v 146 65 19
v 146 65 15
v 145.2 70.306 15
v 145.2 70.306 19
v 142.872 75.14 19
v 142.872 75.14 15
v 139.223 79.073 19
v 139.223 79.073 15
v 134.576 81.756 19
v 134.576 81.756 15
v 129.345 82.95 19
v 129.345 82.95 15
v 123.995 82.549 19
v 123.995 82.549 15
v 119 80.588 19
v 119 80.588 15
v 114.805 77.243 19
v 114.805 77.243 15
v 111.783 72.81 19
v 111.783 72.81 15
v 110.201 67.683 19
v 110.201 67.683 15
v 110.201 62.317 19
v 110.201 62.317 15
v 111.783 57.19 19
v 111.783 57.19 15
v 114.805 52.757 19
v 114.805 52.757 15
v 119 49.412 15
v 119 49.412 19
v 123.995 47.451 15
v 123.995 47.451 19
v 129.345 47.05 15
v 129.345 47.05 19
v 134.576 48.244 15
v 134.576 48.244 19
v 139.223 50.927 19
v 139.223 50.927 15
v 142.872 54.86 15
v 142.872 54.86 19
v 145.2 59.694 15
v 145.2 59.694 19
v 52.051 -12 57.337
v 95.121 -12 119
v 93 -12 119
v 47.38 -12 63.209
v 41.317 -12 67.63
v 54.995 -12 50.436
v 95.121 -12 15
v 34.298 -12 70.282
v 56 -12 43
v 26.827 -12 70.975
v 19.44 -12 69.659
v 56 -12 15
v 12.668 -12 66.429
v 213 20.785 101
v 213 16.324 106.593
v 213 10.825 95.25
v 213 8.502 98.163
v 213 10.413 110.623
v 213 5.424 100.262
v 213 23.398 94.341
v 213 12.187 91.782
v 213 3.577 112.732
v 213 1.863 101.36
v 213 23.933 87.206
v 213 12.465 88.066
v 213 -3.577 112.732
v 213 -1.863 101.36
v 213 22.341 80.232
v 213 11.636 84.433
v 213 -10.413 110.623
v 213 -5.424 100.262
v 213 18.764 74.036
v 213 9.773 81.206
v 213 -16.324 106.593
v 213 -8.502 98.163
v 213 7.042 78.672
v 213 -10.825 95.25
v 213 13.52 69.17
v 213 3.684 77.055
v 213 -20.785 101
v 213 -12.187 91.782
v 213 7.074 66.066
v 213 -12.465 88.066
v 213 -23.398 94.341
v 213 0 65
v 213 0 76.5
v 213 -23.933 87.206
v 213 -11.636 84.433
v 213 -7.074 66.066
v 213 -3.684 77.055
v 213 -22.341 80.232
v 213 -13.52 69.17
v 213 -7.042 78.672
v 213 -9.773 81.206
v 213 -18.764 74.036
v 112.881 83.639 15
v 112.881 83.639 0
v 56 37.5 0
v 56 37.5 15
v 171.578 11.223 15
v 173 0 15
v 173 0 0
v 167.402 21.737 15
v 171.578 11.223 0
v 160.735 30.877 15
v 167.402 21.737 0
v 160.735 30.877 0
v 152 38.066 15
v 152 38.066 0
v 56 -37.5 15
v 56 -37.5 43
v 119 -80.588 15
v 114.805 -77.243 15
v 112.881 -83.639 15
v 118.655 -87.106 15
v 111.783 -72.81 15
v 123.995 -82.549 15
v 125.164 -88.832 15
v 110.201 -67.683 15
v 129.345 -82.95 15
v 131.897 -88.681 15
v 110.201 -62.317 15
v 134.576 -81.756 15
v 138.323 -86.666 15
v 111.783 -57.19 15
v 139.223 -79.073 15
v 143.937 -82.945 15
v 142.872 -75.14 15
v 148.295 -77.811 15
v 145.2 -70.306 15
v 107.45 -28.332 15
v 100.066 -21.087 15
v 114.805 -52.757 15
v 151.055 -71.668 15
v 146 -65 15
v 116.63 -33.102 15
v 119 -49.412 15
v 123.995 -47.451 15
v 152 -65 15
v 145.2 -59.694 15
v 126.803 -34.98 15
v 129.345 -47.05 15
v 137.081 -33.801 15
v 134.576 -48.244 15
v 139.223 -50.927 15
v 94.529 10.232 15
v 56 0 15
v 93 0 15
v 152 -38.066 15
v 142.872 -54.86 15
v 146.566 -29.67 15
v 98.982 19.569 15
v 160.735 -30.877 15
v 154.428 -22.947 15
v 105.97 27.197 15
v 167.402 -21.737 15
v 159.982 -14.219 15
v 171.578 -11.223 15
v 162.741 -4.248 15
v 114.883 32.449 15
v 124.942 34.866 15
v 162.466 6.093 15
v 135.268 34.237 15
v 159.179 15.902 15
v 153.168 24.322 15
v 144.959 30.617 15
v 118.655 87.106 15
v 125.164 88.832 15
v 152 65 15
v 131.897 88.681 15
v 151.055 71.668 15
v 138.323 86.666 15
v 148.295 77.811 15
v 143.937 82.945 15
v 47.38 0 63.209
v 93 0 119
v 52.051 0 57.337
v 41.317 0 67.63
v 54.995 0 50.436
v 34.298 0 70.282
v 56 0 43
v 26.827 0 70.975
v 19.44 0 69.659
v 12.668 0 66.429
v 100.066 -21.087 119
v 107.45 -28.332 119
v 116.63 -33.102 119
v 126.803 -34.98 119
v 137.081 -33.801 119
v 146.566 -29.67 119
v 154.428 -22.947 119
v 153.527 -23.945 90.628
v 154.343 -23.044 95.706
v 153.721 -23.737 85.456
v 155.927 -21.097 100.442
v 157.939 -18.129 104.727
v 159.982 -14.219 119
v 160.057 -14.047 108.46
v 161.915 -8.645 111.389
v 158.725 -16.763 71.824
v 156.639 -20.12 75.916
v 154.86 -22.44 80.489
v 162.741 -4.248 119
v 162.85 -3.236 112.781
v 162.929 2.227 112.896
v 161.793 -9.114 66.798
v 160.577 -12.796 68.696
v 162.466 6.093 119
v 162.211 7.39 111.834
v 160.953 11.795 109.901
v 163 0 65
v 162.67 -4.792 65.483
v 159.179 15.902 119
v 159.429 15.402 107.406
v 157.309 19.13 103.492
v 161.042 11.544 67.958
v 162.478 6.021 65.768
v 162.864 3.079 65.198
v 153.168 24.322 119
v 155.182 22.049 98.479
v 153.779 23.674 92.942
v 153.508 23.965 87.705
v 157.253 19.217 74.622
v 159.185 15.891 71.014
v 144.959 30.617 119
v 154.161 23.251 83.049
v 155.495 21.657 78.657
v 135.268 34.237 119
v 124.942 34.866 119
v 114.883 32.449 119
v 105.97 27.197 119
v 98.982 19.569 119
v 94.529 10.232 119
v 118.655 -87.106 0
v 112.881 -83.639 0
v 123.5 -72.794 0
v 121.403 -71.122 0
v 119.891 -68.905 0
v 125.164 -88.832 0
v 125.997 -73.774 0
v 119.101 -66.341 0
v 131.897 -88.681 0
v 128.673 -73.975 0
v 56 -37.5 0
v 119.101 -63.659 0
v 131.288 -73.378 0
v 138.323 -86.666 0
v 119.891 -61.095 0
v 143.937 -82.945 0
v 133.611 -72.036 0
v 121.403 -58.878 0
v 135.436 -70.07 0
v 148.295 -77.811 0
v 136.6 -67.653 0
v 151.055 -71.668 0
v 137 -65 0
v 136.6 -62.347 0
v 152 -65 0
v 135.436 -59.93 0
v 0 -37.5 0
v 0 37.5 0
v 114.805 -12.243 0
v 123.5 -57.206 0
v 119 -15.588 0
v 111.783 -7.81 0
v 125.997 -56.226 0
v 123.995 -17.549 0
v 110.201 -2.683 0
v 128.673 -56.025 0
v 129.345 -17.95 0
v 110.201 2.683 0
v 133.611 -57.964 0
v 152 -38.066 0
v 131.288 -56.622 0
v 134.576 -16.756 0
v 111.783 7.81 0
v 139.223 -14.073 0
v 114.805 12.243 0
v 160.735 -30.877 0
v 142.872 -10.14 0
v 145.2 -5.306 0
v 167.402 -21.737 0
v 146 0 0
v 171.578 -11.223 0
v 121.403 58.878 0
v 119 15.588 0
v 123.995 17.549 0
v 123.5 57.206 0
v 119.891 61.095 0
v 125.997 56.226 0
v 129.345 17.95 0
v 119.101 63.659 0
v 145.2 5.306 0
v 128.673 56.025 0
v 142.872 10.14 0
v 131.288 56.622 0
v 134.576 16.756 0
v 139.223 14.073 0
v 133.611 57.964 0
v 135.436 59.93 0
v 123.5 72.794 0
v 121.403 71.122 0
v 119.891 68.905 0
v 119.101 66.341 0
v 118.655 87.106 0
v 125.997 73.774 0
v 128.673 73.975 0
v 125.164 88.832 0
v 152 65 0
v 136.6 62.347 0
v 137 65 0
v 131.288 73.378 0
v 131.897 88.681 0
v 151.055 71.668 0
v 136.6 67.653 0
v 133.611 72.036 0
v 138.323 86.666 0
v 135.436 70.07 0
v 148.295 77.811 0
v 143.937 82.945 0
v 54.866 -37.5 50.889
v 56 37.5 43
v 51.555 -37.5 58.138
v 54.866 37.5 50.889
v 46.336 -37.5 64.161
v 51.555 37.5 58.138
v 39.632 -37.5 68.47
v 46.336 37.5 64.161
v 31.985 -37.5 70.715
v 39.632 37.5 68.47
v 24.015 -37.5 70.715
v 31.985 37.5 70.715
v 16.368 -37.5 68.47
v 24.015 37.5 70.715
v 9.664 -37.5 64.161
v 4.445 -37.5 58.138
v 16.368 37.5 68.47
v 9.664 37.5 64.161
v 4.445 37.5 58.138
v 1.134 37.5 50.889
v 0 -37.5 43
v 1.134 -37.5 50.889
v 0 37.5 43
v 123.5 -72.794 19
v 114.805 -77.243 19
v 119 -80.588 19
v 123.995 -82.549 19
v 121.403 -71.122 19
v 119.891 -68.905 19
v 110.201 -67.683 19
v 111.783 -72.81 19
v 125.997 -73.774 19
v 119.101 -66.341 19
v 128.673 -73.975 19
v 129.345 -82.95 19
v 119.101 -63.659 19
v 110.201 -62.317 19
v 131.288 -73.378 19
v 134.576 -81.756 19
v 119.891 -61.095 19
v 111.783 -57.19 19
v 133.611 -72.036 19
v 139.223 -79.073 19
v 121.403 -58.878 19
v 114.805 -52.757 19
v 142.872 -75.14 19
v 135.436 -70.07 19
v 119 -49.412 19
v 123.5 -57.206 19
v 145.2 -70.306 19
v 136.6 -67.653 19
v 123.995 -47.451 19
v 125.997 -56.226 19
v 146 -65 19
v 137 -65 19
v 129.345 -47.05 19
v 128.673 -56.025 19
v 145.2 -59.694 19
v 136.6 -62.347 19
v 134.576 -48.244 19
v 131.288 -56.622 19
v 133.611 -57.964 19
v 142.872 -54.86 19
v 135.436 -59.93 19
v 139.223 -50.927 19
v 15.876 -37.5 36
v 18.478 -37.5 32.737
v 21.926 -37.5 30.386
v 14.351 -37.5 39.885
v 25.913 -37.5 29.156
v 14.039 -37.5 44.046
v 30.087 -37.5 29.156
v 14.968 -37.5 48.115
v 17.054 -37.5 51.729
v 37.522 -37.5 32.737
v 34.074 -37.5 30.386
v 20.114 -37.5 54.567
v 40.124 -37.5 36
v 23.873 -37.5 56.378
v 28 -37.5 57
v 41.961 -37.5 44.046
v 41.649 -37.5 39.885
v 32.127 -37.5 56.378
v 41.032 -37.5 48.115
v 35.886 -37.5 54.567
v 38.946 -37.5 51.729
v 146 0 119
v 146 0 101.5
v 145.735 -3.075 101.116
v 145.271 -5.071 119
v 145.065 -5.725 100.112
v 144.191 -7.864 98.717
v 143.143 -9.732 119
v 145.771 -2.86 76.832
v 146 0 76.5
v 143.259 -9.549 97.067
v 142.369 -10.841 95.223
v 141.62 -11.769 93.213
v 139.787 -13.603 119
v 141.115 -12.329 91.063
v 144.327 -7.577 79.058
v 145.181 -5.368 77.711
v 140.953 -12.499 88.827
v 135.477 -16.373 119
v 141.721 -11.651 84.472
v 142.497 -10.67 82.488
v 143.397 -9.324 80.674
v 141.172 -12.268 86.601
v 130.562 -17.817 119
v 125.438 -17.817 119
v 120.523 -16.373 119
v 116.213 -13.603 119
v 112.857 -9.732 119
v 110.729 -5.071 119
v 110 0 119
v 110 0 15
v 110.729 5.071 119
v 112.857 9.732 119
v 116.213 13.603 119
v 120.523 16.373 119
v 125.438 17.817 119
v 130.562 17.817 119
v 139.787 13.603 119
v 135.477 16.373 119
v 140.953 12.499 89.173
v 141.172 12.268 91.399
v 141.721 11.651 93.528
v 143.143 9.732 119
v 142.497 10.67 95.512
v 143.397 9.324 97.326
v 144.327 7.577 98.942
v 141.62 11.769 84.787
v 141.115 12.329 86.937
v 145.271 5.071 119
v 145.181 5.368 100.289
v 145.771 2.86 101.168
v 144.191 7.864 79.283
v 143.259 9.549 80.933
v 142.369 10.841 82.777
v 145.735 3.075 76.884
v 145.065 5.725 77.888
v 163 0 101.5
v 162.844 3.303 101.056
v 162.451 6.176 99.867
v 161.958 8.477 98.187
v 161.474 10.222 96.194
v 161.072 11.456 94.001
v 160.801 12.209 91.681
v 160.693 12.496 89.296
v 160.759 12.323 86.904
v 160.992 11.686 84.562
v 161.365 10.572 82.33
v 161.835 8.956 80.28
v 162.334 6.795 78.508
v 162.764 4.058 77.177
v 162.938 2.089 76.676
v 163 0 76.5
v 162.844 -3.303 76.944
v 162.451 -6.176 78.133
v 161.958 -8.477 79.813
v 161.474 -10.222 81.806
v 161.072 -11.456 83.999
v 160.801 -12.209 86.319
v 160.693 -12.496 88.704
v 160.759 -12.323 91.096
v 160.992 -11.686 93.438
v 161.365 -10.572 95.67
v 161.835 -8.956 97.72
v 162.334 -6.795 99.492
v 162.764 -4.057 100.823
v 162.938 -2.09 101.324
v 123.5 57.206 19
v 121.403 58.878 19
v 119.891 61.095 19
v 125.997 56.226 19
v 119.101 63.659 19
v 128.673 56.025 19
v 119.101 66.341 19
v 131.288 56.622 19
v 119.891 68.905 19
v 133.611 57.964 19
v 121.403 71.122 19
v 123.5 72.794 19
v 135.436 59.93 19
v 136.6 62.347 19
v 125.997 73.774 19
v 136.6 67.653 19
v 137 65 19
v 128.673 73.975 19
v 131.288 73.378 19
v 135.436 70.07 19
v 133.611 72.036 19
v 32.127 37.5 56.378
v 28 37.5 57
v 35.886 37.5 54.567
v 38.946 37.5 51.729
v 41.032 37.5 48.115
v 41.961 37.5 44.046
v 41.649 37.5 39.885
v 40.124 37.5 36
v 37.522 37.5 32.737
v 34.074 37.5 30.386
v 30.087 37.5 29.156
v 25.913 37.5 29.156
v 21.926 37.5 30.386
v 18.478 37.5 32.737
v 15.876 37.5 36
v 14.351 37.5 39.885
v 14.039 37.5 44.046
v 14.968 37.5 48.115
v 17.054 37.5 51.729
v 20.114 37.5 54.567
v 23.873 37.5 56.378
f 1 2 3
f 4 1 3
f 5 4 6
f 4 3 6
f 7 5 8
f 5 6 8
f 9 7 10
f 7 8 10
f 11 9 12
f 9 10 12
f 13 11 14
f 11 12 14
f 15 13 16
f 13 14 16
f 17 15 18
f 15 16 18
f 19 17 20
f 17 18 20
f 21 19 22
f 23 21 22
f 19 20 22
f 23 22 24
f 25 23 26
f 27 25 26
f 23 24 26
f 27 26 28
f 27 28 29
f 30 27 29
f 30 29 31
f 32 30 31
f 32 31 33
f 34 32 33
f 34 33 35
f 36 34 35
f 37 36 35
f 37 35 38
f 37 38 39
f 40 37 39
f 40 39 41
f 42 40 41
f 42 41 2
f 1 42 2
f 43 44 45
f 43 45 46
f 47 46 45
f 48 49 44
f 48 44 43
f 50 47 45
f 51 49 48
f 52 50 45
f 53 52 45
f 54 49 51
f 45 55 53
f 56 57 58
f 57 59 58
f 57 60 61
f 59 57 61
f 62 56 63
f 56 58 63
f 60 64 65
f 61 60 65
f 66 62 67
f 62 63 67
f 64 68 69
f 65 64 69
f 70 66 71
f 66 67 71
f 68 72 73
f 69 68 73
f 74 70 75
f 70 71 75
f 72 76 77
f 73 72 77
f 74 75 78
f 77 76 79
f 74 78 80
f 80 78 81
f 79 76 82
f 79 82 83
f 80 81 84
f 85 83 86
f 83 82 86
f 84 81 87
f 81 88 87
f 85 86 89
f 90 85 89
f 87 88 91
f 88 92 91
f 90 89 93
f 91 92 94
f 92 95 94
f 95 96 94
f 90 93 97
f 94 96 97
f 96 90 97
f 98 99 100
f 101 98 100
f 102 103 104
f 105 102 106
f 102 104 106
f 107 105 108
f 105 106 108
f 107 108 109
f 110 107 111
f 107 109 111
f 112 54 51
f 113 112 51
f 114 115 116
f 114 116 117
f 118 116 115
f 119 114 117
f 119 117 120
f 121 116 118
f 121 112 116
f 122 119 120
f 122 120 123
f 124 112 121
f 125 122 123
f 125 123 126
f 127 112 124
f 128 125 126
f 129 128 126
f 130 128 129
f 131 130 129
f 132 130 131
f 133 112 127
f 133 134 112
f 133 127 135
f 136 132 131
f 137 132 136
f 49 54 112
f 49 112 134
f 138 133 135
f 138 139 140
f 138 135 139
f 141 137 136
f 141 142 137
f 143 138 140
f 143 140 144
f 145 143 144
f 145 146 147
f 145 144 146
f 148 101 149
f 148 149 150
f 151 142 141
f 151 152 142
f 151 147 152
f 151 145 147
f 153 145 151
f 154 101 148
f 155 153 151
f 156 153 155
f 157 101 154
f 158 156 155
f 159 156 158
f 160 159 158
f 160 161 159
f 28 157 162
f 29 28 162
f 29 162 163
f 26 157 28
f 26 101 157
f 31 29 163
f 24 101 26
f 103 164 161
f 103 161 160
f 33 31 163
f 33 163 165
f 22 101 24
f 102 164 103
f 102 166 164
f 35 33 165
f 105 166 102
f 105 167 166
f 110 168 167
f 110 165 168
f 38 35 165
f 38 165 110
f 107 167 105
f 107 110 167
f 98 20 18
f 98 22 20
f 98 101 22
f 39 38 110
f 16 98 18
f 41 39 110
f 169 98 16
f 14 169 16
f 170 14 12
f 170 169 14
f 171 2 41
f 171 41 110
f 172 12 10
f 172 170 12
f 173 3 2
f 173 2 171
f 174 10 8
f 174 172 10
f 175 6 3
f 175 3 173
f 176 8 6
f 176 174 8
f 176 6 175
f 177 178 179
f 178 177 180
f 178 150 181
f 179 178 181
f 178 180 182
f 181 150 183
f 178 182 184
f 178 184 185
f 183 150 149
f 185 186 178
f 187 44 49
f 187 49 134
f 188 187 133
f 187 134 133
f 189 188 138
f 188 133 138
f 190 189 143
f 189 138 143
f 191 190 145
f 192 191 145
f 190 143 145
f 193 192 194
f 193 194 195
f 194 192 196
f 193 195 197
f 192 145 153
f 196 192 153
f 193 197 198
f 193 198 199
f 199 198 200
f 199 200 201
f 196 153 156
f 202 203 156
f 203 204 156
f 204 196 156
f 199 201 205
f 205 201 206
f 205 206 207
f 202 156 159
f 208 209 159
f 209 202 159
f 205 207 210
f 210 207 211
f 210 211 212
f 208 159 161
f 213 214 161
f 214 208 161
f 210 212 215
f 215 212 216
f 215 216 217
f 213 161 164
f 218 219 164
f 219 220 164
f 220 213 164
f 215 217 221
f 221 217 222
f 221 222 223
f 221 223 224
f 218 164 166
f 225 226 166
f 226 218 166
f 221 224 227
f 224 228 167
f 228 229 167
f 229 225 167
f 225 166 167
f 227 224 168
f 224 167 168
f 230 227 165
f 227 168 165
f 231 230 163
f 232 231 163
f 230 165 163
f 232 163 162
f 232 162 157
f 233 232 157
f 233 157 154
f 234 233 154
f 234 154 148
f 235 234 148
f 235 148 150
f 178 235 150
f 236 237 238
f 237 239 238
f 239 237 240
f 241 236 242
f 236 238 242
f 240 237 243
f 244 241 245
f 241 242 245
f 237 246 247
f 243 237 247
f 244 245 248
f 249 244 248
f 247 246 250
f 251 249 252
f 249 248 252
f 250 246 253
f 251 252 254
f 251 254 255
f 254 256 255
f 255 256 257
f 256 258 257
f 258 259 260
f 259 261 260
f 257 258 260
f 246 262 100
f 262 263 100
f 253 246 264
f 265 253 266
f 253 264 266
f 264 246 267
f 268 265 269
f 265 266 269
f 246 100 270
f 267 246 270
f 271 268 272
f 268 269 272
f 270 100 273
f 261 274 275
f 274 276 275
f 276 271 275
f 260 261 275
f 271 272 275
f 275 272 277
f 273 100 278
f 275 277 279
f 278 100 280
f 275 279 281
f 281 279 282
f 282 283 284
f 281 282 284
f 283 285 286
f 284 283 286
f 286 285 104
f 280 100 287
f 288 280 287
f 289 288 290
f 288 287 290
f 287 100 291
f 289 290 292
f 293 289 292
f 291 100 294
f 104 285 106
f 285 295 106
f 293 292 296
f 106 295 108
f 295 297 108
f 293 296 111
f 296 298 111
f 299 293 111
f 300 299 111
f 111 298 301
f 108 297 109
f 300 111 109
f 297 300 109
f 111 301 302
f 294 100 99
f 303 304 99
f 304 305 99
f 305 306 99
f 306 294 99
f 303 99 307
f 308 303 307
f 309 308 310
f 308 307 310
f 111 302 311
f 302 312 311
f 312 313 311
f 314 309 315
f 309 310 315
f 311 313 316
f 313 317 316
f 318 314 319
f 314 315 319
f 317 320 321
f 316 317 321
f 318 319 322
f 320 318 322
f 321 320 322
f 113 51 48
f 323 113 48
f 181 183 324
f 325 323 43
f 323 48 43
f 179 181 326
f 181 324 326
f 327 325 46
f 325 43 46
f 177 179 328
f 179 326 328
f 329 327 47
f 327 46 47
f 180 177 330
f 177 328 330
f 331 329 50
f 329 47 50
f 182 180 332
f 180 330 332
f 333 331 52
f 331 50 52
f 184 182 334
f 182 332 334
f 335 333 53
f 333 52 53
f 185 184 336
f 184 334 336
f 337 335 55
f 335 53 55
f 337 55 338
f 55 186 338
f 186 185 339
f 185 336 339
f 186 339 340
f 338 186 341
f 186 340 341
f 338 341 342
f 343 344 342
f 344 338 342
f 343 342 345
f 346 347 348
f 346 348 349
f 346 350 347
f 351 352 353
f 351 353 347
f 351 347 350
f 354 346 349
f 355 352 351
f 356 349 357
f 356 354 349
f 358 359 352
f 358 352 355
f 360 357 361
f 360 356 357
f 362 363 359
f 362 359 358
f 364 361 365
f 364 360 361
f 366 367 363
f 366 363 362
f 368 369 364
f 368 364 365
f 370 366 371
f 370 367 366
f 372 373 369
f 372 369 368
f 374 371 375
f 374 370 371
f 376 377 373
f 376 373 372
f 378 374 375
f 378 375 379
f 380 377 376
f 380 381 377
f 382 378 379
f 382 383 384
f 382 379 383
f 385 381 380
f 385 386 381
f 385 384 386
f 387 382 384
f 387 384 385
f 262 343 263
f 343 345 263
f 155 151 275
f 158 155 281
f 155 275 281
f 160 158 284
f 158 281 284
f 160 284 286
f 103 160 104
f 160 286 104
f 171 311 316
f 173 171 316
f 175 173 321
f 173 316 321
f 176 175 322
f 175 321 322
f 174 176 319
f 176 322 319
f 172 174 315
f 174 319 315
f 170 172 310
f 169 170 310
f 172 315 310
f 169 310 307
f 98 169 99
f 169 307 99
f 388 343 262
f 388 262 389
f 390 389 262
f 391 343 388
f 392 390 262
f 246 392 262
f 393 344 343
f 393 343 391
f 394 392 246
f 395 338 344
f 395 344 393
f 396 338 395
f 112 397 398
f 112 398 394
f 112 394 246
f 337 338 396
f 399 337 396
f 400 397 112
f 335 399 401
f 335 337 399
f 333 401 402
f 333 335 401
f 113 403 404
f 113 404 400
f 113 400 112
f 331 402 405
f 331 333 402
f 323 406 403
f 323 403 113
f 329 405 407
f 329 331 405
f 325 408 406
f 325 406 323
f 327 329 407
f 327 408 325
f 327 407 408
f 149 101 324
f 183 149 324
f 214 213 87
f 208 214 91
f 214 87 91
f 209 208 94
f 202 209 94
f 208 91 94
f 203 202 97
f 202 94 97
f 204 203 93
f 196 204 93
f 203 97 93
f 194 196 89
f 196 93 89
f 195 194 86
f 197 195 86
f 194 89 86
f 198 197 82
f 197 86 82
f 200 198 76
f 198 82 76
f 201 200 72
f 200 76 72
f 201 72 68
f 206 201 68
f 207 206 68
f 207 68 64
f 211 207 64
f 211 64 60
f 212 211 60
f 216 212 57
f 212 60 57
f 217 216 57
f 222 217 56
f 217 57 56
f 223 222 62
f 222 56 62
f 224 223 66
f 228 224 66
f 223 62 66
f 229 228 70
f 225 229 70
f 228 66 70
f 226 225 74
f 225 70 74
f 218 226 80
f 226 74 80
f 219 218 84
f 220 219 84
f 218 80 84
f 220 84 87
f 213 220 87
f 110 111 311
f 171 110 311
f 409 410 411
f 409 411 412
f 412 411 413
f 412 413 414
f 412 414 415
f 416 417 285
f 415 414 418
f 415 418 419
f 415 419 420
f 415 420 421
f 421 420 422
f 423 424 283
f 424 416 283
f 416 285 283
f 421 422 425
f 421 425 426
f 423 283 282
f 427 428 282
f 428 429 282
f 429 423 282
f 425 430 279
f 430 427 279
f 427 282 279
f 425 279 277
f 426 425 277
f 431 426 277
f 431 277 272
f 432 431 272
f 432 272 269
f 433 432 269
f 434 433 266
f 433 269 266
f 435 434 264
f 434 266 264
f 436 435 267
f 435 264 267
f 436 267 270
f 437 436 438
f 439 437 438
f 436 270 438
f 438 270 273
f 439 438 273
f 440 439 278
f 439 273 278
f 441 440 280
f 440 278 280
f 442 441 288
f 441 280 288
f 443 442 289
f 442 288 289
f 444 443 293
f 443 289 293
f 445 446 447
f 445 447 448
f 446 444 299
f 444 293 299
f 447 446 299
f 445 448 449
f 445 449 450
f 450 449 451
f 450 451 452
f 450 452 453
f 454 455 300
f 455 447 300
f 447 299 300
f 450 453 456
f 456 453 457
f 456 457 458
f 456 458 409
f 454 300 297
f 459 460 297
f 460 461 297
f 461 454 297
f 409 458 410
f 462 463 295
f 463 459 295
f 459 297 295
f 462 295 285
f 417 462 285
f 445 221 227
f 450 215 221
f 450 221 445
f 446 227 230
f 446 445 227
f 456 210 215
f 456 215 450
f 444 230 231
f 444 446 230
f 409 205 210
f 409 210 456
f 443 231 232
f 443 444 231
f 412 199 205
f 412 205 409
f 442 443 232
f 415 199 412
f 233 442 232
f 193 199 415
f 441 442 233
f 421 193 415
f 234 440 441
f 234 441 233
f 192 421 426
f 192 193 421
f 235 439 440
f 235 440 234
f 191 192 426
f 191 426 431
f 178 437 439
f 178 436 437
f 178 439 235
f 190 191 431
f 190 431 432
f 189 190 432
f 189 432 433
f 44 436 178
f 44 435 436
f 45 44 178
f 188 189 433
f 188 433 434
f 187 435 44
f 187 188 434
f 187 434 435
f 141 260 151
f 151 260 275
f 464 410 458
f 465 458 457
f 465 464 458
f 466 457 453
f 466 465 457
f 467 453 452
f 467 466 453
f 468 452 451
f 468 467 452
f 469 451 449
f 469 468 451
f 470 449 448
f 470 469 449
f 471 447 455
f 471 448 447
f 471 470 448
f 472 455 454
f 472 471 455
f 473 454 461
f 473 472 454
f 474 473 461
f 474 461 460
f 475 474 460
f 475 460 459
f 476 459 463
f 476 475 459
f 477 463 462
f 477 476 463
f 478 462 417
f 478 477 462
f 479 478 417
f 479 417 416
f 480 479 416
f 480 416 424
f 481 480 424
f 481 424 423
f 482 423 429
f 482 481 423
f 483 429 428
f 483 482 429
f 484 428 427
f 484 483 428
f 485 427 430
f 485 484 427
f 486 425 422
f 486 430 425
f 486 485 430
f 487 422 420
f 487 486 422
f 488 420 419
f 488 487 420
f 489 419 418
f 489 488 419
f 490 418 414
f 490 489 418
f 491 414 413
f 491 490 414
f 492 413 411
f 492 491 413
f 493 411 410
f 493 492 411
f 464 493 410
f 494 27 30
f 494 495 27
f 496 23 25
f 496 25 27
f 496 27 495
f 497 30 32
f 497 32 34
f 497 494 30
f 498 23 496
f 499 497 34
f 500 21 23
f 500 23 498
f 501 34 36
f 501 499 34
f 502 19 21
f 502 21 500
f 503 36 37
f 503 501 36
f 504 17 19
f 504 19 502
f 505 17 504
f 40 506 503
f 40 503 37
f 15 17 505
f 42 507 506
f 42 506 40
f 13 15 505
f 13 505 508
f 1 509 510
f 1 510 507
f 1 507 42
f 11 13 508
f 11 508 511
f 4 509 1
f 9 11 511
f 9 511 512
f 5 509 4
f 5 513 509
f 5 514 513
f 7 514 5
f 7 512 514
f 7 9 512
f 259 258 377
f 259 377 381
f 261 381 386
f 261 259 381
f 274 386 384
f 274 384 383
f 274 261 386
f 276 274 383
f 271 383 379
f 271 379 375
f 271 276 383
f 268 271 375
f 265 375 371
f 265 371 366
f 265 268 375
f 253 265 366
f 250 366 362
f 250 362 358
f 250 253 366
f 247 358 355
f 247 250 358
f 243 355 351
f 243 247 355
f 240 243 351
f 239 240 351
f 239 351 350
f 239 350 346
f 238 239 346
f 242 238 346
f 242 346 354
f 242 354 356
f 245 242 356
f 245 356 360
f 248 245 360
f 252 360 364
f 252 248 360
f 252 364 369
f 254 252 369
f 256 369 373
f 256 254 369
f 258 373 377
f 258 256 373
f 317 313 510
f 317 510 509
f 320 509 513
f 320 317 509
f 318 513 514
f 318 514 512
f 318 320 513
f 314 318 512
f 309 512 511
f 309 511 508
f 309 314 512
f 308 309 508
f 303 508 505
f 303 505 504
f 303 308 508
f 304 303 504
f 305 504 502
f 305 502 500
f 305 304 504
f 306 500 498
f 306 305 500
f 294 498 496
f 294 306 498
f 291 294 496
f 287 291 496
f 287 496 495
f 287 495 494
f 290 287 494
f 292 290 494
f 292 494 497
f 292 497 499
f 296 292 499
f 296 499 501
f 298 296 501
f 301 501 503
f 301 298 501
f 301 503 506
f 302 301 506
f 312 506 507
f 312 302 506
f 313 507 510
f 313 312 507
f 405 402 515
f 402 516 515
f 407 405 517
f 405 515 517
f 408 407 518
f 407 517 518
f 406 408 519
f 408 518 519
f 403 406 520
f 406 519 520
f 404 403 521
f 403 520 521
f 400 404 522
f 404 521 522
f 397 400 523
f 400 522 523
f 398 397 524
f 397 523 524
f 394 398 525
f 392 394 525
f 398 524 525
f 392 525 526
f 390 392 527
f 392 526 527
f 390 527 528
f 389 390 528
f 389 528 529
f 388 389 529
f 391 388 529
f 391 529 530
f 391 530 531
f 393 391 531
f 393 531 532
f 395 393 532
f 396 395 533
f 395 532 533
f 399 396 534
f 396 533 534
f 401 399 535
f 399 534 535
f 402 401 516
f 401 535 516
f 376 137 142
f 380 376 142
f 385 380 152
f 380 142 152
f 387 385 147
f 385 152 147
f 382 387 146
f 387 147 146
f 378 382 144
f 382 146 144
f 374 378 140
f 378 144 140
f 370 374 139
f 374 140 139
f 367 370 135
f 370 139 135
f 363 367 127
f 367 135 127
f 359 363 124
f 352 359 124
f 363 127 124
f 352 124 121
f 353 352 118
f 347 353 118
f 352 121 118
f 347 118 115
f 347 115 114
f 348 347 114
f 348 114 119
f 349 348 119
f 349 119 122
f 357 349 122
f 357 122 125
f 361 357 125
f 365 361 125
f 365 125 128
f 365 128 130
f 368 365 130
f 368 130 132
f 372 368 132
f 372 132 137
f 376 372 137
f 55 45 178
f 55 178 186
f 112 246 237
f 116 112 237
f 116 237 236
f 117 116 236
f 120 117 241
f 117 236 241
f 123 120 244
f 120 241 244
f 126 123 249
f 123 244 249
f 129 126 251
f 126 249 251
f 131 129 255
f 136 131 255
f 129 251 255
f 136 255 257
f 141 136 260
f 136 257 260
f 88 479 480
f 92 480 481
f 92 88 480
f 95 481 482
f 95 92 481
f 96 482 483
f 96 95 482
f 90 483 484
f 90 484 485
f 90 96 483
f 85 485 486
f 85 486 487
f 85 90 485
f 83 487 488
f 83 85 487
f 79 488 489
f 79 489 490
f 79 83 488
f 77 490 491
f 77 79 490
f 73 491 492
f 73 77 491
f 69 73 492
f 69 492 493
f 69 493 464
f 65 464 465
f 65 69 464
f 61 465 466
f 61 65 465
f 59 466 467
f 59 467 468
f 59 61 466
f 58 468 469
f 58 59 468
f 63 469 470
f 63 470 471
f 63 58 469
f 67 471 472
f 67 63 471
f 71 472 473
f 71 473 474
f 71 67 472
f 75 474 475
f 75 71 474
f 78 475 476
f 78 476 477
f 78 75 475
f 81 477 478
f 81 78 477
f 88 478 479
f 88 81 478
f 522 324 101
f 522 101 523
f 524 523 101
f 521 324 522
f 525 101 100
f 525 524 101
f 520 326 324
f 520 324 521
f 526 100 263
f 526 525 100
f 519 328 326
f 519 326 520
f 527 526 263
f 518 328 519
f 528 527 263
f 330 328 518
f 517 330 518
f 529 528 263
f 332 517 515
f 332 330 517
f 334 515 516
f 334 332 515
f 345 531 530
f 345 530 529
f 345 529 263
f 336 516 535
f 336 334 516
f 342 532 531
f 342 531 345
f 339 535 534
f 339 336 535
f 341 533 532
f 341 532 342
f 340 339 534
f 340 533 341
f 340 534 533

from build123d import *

# Parameters (mm, degrees)
SKETCH1_R                       = 35
SKETCH1_R_2                     = 18
BOSS_EXTRUDE1_DEPTH             = 15
SKETCH1_4_R                     = 18
SKETCH1_4_R_2                   = 9
BOSS_EXTRUDE2_DEPTH             = 19
SKETCH1_5_R                     = 35
SKETCH1_5_R_2                   = 18
BOSS_EXTRUDE3_DEPTH             = 119
BOSS_EXTRUDE4_REACH             = 230.059
SKETCH2_R                       = 14
BOSS_EXTRUDE4_DIRECTION_2_REACH = 230.059
BOSS_EXTRUDE5_START             = -12
BOSS_EXTRUDE5_DEPTH             = 12
BOSS_EXTRUDE7_REACH             = 443.059
BOSS_EXTRUDE7_END_RADIUS        = 35
BOSS_EXTRUDE7_START             = -213
SKETCH4_R                       = 24
SKETCH4_R_2                     = 12.5
CUT_EXTRUDE1_REACH              = 474.713
CUT_EXTRUDE1_END_RADIUS         = 18
CUT_EXTRUDE1_START              = -213
SKETCH4_3_R                     = 12.5


with BuildPart() as part:
    # Sketch1 → Boss-Extrude1 (new body)
    with BuildSketch(Plane.XY):
        with BuildLine():
            Line((0, -37.5), (56, -37.5))
            Line((56, -37.5), (112.880924764, -83.639033344))
            ThreePointArc((112.880924764, -83.639033344), (138.323327815, -86.666308011), (152, -65))
            Line((152, -65), (152, -38.065732621))
            ThreePointArc((152, -38.065732621), (173, 0), (152, 38.065732621))
            Line((152, 38.065732621), (152, 65))
            ThreePointArc((152, 65), (138.323327815, 86.666308011), (112.880924764, 83.639033344))
            Line((112.880924764, 83.639033344), (56, 37.5))
            Line((56, 37.5), (0, 37.5))
            Line((0, 37.5), (0, -37.5))
        make_face()
        with Locations((128, 0)):
            Circle(SKETCH1_R, mode=Mode.SUBTRACT)
        with Locations((128, -65)):
            Circle(SKETCH1_R_2, mode=Mode.SUBTRACT)
        with Locations((128, 65)):
            Circle(SKETCH1_R_2, mode=Mode.SUBTRACT)
    extrude(amount=BOSS_EXTRUDE1_DEPTH)

    # Sketch1<4> → Boss-Extrude2 (add)
    # profile 1 of 2: a face of its own
    with BuildSketch(Plane.XY):
        with Locations((128, 65)):
            Circle(SKETCH1_4_R)
        with Locations((128, 65)):
            Circle(SKETCH1_4_R_2, mode=Mode.SUBTRACT)
    # profile 2 of 2: a face of its own
    with BuildSketch(Plane.XY):
        with Locations((128, -65)):
            Circle(SKETCH1_4_R)
        with Locations((128, -65)):
            Circle(SKETCH1_4_R_2, mode=Mode.SUBTRACT)
    extrude(amount=BOSS_EXTRUDE2_DEPTH)

    # Sketch1<5> → Boss-Extrude3 (add)
    with BuildSketch(Plane.XY):
        with Locations((128, 0)):
            Circle(SKETCH1_5_R)
        with Locations((128, 0)):
            Circle(SKETCH1_5_R_2, mode=Mode.SUBTRACT)
    extrude(amount=BOSS_EXTRUDE3_DEPTH)

    # Boss-Extrude4: up to this face of the body (flat: up to its plane)
    boss_extrude4_end = Plane(part.part.faces().sort_by_distance((28, 37.5, 7.5))[0])
    # Sketch2 → Boss-Extrude4 (add, up to the picked face)
    with BuildSketch(Plane(origin=(0, 0, 0), x_dir=(1, 0, 0), z_dir=(0, 1, 0)), mode=Mode.PRIVATE) as boss_extrude4_sk1:
        with BuildLine():
            Line((56, -15), (56, -43))
            ThreePointArc((56, -43), (28, -71), (0, -43))
            Line((0, -43), (0, -15))
            Line((0, -15), (56, -15))
        make_face()
        with Locations((28, -43)):
            Circle(SKETCH2_R, mode=Mode.SUBTRACT)
    boss_extrude4_tool1 = split(extrude(boss_extrude4_sk1.sketch, amount=BOSS_EXTRUDE4_REACH, mode=Mode.PRIVATE), bisect_by=boss_extrude4_end, keep=Keep.BOTH, mode=Mode.PRIVATE)
    add(boss_extrude4_tool1.solids().sort_by(Axis((0.79196, 0, 29), (0, 1, 0)))[0])

    # Boss-Extrude4 direction 2: up to this face of the body (flat: up to its plane)
    boss_extrude4_direction_2_end = Plane(part.part.faces().sort_by_distance((28, -37.5, 7.5))[0])
    # Sketch2 → Boss-Extrude4 direction 2 (add, up to the picked face)
    with BuildSketch(Plane(origin=(0, 0, 0), x_dir=(1, 0, 0), z_dir=(0, 1, 0)), mode=Mode.PRIVATE) as boss_extrude4_direction_2_sk1:
        with BuildLine():
            Line((56, -15), (56, -43))
            ThreePointArc((56, -43), (28, -71), (0, -43))
            Line((0, -43), (0, -15))
            Line((0, -15), (56, -15))
        make_face()
        with Locations((28, -43)):
            Circle(SKETCH2_R, mode=Mode.SUBTRACT)
    boss_extrude4_direction_2_tool1 = split(extrude(boss_extrude4_direction_2_sk1.sketch, amount=-BOSS_EXTRUDE4_DIRECTION_2_REACH, mode=Mode.PRIVATE), bisect_by=boss_extrude4_direction_2_end, keep=Keep.BOTH, mode=Mode.PRIVATE)
    add(boss_extrude4_direction_2_tool1.solids().sort_by(Axis((0.79196, 0, 29), (0, -1, 0)))[0])

    # Sketch3 → Boss-Extrude5 (add)
    with BuildSketch(Plane(origin=(0, 0, 0), x_dir=(1, 0, 0), z_dir=(0, 1, 0)).offset(BOSS_EXTRUDE5_START)):
        with BuildLine():
            Line((93, -119), (12.667624934, -66.42900499))
            ThreePointArc((12.667624934, -66.42900499), (41.317159948, -67.630331929), (56, -43))
            Line((56, -43), (56, -15))
            Line((56, -15), (93, -15))
            Line((93, -15), (110, -15))
            Line((110, -15), (110, -119))
            Line((110, -119), (93, -119))
        make_face()
    extrude(amount=BOSS_EXTRUDE5_DEPTH)

    # Boss-Extrude7: up to this cylinder (the profile starts outside it)
    boss_extrude7_end = Plane(origin=(128, 0, 65.678823), z_dir=(0, 0, -1)) * Cylinder(BOSS_EXTRUDE7_END_RADIUS, 957.118, mode=Mode.PRIVATE)
    # Sketch4 → Boss-Extrude7 (add, up to the surface)
    with BuildSketch(Plane.ZY.offset(BOSS_EXTRUDE7_START), mode=Mode.PRIVATE) as boss_extrude7_sk1:
        with Locations((89, 0)):
            Circle(SKETCH4_R)
        with Locations((89, 0)):
            Circle(SKETCH4_R_2, mode=Mode.SUBTRACT)
    boss_extrude7_tool1 = extrude(boss_extrude7_sk1.sketch, amount=BOSS_EXTRUDE7_REACH, mode=Mode.PRIVATE) - boss_extrude7_end
    add(boss_extrude7_tool1.solids().sort_by_distance((213, 0, 65.678823))[0])

    # Cut-Extrude1: up to this cylinder (the profile starts outside it)
    cut_extrude1_end = Plane(origin=(128, 0, 89), z_dir=(0, 0, -1)) * Cylinder(CUT_EXTRUDE1_END_RADIUS, 986.426, mode=Mode.PRIVATE)
    # Sketch4<3> → Cut-Extrude1 (cut, up to the surface)
    with BuildSketch(Plane.ZY.offset(CUT_EXTRUDE1_START), mode=Mode.PRIVATE) as cut_extrude1_sk1:
        with Locations((89, 0)):
            Circle(SKETCH4_3_R)
    cut_extrude1_tool1 = extrude(cut_extrude1_sk1.sketch, amount=CUT_EXTRUDE1_REACH, mode=Mode.PRIVATE) - cut_extrude1_end
    add(cut_extrude1_tool1.solids().sort_by_distance((213, 0, 89))[0], mode=Mode.SUBTRACT)


solid = part.part
